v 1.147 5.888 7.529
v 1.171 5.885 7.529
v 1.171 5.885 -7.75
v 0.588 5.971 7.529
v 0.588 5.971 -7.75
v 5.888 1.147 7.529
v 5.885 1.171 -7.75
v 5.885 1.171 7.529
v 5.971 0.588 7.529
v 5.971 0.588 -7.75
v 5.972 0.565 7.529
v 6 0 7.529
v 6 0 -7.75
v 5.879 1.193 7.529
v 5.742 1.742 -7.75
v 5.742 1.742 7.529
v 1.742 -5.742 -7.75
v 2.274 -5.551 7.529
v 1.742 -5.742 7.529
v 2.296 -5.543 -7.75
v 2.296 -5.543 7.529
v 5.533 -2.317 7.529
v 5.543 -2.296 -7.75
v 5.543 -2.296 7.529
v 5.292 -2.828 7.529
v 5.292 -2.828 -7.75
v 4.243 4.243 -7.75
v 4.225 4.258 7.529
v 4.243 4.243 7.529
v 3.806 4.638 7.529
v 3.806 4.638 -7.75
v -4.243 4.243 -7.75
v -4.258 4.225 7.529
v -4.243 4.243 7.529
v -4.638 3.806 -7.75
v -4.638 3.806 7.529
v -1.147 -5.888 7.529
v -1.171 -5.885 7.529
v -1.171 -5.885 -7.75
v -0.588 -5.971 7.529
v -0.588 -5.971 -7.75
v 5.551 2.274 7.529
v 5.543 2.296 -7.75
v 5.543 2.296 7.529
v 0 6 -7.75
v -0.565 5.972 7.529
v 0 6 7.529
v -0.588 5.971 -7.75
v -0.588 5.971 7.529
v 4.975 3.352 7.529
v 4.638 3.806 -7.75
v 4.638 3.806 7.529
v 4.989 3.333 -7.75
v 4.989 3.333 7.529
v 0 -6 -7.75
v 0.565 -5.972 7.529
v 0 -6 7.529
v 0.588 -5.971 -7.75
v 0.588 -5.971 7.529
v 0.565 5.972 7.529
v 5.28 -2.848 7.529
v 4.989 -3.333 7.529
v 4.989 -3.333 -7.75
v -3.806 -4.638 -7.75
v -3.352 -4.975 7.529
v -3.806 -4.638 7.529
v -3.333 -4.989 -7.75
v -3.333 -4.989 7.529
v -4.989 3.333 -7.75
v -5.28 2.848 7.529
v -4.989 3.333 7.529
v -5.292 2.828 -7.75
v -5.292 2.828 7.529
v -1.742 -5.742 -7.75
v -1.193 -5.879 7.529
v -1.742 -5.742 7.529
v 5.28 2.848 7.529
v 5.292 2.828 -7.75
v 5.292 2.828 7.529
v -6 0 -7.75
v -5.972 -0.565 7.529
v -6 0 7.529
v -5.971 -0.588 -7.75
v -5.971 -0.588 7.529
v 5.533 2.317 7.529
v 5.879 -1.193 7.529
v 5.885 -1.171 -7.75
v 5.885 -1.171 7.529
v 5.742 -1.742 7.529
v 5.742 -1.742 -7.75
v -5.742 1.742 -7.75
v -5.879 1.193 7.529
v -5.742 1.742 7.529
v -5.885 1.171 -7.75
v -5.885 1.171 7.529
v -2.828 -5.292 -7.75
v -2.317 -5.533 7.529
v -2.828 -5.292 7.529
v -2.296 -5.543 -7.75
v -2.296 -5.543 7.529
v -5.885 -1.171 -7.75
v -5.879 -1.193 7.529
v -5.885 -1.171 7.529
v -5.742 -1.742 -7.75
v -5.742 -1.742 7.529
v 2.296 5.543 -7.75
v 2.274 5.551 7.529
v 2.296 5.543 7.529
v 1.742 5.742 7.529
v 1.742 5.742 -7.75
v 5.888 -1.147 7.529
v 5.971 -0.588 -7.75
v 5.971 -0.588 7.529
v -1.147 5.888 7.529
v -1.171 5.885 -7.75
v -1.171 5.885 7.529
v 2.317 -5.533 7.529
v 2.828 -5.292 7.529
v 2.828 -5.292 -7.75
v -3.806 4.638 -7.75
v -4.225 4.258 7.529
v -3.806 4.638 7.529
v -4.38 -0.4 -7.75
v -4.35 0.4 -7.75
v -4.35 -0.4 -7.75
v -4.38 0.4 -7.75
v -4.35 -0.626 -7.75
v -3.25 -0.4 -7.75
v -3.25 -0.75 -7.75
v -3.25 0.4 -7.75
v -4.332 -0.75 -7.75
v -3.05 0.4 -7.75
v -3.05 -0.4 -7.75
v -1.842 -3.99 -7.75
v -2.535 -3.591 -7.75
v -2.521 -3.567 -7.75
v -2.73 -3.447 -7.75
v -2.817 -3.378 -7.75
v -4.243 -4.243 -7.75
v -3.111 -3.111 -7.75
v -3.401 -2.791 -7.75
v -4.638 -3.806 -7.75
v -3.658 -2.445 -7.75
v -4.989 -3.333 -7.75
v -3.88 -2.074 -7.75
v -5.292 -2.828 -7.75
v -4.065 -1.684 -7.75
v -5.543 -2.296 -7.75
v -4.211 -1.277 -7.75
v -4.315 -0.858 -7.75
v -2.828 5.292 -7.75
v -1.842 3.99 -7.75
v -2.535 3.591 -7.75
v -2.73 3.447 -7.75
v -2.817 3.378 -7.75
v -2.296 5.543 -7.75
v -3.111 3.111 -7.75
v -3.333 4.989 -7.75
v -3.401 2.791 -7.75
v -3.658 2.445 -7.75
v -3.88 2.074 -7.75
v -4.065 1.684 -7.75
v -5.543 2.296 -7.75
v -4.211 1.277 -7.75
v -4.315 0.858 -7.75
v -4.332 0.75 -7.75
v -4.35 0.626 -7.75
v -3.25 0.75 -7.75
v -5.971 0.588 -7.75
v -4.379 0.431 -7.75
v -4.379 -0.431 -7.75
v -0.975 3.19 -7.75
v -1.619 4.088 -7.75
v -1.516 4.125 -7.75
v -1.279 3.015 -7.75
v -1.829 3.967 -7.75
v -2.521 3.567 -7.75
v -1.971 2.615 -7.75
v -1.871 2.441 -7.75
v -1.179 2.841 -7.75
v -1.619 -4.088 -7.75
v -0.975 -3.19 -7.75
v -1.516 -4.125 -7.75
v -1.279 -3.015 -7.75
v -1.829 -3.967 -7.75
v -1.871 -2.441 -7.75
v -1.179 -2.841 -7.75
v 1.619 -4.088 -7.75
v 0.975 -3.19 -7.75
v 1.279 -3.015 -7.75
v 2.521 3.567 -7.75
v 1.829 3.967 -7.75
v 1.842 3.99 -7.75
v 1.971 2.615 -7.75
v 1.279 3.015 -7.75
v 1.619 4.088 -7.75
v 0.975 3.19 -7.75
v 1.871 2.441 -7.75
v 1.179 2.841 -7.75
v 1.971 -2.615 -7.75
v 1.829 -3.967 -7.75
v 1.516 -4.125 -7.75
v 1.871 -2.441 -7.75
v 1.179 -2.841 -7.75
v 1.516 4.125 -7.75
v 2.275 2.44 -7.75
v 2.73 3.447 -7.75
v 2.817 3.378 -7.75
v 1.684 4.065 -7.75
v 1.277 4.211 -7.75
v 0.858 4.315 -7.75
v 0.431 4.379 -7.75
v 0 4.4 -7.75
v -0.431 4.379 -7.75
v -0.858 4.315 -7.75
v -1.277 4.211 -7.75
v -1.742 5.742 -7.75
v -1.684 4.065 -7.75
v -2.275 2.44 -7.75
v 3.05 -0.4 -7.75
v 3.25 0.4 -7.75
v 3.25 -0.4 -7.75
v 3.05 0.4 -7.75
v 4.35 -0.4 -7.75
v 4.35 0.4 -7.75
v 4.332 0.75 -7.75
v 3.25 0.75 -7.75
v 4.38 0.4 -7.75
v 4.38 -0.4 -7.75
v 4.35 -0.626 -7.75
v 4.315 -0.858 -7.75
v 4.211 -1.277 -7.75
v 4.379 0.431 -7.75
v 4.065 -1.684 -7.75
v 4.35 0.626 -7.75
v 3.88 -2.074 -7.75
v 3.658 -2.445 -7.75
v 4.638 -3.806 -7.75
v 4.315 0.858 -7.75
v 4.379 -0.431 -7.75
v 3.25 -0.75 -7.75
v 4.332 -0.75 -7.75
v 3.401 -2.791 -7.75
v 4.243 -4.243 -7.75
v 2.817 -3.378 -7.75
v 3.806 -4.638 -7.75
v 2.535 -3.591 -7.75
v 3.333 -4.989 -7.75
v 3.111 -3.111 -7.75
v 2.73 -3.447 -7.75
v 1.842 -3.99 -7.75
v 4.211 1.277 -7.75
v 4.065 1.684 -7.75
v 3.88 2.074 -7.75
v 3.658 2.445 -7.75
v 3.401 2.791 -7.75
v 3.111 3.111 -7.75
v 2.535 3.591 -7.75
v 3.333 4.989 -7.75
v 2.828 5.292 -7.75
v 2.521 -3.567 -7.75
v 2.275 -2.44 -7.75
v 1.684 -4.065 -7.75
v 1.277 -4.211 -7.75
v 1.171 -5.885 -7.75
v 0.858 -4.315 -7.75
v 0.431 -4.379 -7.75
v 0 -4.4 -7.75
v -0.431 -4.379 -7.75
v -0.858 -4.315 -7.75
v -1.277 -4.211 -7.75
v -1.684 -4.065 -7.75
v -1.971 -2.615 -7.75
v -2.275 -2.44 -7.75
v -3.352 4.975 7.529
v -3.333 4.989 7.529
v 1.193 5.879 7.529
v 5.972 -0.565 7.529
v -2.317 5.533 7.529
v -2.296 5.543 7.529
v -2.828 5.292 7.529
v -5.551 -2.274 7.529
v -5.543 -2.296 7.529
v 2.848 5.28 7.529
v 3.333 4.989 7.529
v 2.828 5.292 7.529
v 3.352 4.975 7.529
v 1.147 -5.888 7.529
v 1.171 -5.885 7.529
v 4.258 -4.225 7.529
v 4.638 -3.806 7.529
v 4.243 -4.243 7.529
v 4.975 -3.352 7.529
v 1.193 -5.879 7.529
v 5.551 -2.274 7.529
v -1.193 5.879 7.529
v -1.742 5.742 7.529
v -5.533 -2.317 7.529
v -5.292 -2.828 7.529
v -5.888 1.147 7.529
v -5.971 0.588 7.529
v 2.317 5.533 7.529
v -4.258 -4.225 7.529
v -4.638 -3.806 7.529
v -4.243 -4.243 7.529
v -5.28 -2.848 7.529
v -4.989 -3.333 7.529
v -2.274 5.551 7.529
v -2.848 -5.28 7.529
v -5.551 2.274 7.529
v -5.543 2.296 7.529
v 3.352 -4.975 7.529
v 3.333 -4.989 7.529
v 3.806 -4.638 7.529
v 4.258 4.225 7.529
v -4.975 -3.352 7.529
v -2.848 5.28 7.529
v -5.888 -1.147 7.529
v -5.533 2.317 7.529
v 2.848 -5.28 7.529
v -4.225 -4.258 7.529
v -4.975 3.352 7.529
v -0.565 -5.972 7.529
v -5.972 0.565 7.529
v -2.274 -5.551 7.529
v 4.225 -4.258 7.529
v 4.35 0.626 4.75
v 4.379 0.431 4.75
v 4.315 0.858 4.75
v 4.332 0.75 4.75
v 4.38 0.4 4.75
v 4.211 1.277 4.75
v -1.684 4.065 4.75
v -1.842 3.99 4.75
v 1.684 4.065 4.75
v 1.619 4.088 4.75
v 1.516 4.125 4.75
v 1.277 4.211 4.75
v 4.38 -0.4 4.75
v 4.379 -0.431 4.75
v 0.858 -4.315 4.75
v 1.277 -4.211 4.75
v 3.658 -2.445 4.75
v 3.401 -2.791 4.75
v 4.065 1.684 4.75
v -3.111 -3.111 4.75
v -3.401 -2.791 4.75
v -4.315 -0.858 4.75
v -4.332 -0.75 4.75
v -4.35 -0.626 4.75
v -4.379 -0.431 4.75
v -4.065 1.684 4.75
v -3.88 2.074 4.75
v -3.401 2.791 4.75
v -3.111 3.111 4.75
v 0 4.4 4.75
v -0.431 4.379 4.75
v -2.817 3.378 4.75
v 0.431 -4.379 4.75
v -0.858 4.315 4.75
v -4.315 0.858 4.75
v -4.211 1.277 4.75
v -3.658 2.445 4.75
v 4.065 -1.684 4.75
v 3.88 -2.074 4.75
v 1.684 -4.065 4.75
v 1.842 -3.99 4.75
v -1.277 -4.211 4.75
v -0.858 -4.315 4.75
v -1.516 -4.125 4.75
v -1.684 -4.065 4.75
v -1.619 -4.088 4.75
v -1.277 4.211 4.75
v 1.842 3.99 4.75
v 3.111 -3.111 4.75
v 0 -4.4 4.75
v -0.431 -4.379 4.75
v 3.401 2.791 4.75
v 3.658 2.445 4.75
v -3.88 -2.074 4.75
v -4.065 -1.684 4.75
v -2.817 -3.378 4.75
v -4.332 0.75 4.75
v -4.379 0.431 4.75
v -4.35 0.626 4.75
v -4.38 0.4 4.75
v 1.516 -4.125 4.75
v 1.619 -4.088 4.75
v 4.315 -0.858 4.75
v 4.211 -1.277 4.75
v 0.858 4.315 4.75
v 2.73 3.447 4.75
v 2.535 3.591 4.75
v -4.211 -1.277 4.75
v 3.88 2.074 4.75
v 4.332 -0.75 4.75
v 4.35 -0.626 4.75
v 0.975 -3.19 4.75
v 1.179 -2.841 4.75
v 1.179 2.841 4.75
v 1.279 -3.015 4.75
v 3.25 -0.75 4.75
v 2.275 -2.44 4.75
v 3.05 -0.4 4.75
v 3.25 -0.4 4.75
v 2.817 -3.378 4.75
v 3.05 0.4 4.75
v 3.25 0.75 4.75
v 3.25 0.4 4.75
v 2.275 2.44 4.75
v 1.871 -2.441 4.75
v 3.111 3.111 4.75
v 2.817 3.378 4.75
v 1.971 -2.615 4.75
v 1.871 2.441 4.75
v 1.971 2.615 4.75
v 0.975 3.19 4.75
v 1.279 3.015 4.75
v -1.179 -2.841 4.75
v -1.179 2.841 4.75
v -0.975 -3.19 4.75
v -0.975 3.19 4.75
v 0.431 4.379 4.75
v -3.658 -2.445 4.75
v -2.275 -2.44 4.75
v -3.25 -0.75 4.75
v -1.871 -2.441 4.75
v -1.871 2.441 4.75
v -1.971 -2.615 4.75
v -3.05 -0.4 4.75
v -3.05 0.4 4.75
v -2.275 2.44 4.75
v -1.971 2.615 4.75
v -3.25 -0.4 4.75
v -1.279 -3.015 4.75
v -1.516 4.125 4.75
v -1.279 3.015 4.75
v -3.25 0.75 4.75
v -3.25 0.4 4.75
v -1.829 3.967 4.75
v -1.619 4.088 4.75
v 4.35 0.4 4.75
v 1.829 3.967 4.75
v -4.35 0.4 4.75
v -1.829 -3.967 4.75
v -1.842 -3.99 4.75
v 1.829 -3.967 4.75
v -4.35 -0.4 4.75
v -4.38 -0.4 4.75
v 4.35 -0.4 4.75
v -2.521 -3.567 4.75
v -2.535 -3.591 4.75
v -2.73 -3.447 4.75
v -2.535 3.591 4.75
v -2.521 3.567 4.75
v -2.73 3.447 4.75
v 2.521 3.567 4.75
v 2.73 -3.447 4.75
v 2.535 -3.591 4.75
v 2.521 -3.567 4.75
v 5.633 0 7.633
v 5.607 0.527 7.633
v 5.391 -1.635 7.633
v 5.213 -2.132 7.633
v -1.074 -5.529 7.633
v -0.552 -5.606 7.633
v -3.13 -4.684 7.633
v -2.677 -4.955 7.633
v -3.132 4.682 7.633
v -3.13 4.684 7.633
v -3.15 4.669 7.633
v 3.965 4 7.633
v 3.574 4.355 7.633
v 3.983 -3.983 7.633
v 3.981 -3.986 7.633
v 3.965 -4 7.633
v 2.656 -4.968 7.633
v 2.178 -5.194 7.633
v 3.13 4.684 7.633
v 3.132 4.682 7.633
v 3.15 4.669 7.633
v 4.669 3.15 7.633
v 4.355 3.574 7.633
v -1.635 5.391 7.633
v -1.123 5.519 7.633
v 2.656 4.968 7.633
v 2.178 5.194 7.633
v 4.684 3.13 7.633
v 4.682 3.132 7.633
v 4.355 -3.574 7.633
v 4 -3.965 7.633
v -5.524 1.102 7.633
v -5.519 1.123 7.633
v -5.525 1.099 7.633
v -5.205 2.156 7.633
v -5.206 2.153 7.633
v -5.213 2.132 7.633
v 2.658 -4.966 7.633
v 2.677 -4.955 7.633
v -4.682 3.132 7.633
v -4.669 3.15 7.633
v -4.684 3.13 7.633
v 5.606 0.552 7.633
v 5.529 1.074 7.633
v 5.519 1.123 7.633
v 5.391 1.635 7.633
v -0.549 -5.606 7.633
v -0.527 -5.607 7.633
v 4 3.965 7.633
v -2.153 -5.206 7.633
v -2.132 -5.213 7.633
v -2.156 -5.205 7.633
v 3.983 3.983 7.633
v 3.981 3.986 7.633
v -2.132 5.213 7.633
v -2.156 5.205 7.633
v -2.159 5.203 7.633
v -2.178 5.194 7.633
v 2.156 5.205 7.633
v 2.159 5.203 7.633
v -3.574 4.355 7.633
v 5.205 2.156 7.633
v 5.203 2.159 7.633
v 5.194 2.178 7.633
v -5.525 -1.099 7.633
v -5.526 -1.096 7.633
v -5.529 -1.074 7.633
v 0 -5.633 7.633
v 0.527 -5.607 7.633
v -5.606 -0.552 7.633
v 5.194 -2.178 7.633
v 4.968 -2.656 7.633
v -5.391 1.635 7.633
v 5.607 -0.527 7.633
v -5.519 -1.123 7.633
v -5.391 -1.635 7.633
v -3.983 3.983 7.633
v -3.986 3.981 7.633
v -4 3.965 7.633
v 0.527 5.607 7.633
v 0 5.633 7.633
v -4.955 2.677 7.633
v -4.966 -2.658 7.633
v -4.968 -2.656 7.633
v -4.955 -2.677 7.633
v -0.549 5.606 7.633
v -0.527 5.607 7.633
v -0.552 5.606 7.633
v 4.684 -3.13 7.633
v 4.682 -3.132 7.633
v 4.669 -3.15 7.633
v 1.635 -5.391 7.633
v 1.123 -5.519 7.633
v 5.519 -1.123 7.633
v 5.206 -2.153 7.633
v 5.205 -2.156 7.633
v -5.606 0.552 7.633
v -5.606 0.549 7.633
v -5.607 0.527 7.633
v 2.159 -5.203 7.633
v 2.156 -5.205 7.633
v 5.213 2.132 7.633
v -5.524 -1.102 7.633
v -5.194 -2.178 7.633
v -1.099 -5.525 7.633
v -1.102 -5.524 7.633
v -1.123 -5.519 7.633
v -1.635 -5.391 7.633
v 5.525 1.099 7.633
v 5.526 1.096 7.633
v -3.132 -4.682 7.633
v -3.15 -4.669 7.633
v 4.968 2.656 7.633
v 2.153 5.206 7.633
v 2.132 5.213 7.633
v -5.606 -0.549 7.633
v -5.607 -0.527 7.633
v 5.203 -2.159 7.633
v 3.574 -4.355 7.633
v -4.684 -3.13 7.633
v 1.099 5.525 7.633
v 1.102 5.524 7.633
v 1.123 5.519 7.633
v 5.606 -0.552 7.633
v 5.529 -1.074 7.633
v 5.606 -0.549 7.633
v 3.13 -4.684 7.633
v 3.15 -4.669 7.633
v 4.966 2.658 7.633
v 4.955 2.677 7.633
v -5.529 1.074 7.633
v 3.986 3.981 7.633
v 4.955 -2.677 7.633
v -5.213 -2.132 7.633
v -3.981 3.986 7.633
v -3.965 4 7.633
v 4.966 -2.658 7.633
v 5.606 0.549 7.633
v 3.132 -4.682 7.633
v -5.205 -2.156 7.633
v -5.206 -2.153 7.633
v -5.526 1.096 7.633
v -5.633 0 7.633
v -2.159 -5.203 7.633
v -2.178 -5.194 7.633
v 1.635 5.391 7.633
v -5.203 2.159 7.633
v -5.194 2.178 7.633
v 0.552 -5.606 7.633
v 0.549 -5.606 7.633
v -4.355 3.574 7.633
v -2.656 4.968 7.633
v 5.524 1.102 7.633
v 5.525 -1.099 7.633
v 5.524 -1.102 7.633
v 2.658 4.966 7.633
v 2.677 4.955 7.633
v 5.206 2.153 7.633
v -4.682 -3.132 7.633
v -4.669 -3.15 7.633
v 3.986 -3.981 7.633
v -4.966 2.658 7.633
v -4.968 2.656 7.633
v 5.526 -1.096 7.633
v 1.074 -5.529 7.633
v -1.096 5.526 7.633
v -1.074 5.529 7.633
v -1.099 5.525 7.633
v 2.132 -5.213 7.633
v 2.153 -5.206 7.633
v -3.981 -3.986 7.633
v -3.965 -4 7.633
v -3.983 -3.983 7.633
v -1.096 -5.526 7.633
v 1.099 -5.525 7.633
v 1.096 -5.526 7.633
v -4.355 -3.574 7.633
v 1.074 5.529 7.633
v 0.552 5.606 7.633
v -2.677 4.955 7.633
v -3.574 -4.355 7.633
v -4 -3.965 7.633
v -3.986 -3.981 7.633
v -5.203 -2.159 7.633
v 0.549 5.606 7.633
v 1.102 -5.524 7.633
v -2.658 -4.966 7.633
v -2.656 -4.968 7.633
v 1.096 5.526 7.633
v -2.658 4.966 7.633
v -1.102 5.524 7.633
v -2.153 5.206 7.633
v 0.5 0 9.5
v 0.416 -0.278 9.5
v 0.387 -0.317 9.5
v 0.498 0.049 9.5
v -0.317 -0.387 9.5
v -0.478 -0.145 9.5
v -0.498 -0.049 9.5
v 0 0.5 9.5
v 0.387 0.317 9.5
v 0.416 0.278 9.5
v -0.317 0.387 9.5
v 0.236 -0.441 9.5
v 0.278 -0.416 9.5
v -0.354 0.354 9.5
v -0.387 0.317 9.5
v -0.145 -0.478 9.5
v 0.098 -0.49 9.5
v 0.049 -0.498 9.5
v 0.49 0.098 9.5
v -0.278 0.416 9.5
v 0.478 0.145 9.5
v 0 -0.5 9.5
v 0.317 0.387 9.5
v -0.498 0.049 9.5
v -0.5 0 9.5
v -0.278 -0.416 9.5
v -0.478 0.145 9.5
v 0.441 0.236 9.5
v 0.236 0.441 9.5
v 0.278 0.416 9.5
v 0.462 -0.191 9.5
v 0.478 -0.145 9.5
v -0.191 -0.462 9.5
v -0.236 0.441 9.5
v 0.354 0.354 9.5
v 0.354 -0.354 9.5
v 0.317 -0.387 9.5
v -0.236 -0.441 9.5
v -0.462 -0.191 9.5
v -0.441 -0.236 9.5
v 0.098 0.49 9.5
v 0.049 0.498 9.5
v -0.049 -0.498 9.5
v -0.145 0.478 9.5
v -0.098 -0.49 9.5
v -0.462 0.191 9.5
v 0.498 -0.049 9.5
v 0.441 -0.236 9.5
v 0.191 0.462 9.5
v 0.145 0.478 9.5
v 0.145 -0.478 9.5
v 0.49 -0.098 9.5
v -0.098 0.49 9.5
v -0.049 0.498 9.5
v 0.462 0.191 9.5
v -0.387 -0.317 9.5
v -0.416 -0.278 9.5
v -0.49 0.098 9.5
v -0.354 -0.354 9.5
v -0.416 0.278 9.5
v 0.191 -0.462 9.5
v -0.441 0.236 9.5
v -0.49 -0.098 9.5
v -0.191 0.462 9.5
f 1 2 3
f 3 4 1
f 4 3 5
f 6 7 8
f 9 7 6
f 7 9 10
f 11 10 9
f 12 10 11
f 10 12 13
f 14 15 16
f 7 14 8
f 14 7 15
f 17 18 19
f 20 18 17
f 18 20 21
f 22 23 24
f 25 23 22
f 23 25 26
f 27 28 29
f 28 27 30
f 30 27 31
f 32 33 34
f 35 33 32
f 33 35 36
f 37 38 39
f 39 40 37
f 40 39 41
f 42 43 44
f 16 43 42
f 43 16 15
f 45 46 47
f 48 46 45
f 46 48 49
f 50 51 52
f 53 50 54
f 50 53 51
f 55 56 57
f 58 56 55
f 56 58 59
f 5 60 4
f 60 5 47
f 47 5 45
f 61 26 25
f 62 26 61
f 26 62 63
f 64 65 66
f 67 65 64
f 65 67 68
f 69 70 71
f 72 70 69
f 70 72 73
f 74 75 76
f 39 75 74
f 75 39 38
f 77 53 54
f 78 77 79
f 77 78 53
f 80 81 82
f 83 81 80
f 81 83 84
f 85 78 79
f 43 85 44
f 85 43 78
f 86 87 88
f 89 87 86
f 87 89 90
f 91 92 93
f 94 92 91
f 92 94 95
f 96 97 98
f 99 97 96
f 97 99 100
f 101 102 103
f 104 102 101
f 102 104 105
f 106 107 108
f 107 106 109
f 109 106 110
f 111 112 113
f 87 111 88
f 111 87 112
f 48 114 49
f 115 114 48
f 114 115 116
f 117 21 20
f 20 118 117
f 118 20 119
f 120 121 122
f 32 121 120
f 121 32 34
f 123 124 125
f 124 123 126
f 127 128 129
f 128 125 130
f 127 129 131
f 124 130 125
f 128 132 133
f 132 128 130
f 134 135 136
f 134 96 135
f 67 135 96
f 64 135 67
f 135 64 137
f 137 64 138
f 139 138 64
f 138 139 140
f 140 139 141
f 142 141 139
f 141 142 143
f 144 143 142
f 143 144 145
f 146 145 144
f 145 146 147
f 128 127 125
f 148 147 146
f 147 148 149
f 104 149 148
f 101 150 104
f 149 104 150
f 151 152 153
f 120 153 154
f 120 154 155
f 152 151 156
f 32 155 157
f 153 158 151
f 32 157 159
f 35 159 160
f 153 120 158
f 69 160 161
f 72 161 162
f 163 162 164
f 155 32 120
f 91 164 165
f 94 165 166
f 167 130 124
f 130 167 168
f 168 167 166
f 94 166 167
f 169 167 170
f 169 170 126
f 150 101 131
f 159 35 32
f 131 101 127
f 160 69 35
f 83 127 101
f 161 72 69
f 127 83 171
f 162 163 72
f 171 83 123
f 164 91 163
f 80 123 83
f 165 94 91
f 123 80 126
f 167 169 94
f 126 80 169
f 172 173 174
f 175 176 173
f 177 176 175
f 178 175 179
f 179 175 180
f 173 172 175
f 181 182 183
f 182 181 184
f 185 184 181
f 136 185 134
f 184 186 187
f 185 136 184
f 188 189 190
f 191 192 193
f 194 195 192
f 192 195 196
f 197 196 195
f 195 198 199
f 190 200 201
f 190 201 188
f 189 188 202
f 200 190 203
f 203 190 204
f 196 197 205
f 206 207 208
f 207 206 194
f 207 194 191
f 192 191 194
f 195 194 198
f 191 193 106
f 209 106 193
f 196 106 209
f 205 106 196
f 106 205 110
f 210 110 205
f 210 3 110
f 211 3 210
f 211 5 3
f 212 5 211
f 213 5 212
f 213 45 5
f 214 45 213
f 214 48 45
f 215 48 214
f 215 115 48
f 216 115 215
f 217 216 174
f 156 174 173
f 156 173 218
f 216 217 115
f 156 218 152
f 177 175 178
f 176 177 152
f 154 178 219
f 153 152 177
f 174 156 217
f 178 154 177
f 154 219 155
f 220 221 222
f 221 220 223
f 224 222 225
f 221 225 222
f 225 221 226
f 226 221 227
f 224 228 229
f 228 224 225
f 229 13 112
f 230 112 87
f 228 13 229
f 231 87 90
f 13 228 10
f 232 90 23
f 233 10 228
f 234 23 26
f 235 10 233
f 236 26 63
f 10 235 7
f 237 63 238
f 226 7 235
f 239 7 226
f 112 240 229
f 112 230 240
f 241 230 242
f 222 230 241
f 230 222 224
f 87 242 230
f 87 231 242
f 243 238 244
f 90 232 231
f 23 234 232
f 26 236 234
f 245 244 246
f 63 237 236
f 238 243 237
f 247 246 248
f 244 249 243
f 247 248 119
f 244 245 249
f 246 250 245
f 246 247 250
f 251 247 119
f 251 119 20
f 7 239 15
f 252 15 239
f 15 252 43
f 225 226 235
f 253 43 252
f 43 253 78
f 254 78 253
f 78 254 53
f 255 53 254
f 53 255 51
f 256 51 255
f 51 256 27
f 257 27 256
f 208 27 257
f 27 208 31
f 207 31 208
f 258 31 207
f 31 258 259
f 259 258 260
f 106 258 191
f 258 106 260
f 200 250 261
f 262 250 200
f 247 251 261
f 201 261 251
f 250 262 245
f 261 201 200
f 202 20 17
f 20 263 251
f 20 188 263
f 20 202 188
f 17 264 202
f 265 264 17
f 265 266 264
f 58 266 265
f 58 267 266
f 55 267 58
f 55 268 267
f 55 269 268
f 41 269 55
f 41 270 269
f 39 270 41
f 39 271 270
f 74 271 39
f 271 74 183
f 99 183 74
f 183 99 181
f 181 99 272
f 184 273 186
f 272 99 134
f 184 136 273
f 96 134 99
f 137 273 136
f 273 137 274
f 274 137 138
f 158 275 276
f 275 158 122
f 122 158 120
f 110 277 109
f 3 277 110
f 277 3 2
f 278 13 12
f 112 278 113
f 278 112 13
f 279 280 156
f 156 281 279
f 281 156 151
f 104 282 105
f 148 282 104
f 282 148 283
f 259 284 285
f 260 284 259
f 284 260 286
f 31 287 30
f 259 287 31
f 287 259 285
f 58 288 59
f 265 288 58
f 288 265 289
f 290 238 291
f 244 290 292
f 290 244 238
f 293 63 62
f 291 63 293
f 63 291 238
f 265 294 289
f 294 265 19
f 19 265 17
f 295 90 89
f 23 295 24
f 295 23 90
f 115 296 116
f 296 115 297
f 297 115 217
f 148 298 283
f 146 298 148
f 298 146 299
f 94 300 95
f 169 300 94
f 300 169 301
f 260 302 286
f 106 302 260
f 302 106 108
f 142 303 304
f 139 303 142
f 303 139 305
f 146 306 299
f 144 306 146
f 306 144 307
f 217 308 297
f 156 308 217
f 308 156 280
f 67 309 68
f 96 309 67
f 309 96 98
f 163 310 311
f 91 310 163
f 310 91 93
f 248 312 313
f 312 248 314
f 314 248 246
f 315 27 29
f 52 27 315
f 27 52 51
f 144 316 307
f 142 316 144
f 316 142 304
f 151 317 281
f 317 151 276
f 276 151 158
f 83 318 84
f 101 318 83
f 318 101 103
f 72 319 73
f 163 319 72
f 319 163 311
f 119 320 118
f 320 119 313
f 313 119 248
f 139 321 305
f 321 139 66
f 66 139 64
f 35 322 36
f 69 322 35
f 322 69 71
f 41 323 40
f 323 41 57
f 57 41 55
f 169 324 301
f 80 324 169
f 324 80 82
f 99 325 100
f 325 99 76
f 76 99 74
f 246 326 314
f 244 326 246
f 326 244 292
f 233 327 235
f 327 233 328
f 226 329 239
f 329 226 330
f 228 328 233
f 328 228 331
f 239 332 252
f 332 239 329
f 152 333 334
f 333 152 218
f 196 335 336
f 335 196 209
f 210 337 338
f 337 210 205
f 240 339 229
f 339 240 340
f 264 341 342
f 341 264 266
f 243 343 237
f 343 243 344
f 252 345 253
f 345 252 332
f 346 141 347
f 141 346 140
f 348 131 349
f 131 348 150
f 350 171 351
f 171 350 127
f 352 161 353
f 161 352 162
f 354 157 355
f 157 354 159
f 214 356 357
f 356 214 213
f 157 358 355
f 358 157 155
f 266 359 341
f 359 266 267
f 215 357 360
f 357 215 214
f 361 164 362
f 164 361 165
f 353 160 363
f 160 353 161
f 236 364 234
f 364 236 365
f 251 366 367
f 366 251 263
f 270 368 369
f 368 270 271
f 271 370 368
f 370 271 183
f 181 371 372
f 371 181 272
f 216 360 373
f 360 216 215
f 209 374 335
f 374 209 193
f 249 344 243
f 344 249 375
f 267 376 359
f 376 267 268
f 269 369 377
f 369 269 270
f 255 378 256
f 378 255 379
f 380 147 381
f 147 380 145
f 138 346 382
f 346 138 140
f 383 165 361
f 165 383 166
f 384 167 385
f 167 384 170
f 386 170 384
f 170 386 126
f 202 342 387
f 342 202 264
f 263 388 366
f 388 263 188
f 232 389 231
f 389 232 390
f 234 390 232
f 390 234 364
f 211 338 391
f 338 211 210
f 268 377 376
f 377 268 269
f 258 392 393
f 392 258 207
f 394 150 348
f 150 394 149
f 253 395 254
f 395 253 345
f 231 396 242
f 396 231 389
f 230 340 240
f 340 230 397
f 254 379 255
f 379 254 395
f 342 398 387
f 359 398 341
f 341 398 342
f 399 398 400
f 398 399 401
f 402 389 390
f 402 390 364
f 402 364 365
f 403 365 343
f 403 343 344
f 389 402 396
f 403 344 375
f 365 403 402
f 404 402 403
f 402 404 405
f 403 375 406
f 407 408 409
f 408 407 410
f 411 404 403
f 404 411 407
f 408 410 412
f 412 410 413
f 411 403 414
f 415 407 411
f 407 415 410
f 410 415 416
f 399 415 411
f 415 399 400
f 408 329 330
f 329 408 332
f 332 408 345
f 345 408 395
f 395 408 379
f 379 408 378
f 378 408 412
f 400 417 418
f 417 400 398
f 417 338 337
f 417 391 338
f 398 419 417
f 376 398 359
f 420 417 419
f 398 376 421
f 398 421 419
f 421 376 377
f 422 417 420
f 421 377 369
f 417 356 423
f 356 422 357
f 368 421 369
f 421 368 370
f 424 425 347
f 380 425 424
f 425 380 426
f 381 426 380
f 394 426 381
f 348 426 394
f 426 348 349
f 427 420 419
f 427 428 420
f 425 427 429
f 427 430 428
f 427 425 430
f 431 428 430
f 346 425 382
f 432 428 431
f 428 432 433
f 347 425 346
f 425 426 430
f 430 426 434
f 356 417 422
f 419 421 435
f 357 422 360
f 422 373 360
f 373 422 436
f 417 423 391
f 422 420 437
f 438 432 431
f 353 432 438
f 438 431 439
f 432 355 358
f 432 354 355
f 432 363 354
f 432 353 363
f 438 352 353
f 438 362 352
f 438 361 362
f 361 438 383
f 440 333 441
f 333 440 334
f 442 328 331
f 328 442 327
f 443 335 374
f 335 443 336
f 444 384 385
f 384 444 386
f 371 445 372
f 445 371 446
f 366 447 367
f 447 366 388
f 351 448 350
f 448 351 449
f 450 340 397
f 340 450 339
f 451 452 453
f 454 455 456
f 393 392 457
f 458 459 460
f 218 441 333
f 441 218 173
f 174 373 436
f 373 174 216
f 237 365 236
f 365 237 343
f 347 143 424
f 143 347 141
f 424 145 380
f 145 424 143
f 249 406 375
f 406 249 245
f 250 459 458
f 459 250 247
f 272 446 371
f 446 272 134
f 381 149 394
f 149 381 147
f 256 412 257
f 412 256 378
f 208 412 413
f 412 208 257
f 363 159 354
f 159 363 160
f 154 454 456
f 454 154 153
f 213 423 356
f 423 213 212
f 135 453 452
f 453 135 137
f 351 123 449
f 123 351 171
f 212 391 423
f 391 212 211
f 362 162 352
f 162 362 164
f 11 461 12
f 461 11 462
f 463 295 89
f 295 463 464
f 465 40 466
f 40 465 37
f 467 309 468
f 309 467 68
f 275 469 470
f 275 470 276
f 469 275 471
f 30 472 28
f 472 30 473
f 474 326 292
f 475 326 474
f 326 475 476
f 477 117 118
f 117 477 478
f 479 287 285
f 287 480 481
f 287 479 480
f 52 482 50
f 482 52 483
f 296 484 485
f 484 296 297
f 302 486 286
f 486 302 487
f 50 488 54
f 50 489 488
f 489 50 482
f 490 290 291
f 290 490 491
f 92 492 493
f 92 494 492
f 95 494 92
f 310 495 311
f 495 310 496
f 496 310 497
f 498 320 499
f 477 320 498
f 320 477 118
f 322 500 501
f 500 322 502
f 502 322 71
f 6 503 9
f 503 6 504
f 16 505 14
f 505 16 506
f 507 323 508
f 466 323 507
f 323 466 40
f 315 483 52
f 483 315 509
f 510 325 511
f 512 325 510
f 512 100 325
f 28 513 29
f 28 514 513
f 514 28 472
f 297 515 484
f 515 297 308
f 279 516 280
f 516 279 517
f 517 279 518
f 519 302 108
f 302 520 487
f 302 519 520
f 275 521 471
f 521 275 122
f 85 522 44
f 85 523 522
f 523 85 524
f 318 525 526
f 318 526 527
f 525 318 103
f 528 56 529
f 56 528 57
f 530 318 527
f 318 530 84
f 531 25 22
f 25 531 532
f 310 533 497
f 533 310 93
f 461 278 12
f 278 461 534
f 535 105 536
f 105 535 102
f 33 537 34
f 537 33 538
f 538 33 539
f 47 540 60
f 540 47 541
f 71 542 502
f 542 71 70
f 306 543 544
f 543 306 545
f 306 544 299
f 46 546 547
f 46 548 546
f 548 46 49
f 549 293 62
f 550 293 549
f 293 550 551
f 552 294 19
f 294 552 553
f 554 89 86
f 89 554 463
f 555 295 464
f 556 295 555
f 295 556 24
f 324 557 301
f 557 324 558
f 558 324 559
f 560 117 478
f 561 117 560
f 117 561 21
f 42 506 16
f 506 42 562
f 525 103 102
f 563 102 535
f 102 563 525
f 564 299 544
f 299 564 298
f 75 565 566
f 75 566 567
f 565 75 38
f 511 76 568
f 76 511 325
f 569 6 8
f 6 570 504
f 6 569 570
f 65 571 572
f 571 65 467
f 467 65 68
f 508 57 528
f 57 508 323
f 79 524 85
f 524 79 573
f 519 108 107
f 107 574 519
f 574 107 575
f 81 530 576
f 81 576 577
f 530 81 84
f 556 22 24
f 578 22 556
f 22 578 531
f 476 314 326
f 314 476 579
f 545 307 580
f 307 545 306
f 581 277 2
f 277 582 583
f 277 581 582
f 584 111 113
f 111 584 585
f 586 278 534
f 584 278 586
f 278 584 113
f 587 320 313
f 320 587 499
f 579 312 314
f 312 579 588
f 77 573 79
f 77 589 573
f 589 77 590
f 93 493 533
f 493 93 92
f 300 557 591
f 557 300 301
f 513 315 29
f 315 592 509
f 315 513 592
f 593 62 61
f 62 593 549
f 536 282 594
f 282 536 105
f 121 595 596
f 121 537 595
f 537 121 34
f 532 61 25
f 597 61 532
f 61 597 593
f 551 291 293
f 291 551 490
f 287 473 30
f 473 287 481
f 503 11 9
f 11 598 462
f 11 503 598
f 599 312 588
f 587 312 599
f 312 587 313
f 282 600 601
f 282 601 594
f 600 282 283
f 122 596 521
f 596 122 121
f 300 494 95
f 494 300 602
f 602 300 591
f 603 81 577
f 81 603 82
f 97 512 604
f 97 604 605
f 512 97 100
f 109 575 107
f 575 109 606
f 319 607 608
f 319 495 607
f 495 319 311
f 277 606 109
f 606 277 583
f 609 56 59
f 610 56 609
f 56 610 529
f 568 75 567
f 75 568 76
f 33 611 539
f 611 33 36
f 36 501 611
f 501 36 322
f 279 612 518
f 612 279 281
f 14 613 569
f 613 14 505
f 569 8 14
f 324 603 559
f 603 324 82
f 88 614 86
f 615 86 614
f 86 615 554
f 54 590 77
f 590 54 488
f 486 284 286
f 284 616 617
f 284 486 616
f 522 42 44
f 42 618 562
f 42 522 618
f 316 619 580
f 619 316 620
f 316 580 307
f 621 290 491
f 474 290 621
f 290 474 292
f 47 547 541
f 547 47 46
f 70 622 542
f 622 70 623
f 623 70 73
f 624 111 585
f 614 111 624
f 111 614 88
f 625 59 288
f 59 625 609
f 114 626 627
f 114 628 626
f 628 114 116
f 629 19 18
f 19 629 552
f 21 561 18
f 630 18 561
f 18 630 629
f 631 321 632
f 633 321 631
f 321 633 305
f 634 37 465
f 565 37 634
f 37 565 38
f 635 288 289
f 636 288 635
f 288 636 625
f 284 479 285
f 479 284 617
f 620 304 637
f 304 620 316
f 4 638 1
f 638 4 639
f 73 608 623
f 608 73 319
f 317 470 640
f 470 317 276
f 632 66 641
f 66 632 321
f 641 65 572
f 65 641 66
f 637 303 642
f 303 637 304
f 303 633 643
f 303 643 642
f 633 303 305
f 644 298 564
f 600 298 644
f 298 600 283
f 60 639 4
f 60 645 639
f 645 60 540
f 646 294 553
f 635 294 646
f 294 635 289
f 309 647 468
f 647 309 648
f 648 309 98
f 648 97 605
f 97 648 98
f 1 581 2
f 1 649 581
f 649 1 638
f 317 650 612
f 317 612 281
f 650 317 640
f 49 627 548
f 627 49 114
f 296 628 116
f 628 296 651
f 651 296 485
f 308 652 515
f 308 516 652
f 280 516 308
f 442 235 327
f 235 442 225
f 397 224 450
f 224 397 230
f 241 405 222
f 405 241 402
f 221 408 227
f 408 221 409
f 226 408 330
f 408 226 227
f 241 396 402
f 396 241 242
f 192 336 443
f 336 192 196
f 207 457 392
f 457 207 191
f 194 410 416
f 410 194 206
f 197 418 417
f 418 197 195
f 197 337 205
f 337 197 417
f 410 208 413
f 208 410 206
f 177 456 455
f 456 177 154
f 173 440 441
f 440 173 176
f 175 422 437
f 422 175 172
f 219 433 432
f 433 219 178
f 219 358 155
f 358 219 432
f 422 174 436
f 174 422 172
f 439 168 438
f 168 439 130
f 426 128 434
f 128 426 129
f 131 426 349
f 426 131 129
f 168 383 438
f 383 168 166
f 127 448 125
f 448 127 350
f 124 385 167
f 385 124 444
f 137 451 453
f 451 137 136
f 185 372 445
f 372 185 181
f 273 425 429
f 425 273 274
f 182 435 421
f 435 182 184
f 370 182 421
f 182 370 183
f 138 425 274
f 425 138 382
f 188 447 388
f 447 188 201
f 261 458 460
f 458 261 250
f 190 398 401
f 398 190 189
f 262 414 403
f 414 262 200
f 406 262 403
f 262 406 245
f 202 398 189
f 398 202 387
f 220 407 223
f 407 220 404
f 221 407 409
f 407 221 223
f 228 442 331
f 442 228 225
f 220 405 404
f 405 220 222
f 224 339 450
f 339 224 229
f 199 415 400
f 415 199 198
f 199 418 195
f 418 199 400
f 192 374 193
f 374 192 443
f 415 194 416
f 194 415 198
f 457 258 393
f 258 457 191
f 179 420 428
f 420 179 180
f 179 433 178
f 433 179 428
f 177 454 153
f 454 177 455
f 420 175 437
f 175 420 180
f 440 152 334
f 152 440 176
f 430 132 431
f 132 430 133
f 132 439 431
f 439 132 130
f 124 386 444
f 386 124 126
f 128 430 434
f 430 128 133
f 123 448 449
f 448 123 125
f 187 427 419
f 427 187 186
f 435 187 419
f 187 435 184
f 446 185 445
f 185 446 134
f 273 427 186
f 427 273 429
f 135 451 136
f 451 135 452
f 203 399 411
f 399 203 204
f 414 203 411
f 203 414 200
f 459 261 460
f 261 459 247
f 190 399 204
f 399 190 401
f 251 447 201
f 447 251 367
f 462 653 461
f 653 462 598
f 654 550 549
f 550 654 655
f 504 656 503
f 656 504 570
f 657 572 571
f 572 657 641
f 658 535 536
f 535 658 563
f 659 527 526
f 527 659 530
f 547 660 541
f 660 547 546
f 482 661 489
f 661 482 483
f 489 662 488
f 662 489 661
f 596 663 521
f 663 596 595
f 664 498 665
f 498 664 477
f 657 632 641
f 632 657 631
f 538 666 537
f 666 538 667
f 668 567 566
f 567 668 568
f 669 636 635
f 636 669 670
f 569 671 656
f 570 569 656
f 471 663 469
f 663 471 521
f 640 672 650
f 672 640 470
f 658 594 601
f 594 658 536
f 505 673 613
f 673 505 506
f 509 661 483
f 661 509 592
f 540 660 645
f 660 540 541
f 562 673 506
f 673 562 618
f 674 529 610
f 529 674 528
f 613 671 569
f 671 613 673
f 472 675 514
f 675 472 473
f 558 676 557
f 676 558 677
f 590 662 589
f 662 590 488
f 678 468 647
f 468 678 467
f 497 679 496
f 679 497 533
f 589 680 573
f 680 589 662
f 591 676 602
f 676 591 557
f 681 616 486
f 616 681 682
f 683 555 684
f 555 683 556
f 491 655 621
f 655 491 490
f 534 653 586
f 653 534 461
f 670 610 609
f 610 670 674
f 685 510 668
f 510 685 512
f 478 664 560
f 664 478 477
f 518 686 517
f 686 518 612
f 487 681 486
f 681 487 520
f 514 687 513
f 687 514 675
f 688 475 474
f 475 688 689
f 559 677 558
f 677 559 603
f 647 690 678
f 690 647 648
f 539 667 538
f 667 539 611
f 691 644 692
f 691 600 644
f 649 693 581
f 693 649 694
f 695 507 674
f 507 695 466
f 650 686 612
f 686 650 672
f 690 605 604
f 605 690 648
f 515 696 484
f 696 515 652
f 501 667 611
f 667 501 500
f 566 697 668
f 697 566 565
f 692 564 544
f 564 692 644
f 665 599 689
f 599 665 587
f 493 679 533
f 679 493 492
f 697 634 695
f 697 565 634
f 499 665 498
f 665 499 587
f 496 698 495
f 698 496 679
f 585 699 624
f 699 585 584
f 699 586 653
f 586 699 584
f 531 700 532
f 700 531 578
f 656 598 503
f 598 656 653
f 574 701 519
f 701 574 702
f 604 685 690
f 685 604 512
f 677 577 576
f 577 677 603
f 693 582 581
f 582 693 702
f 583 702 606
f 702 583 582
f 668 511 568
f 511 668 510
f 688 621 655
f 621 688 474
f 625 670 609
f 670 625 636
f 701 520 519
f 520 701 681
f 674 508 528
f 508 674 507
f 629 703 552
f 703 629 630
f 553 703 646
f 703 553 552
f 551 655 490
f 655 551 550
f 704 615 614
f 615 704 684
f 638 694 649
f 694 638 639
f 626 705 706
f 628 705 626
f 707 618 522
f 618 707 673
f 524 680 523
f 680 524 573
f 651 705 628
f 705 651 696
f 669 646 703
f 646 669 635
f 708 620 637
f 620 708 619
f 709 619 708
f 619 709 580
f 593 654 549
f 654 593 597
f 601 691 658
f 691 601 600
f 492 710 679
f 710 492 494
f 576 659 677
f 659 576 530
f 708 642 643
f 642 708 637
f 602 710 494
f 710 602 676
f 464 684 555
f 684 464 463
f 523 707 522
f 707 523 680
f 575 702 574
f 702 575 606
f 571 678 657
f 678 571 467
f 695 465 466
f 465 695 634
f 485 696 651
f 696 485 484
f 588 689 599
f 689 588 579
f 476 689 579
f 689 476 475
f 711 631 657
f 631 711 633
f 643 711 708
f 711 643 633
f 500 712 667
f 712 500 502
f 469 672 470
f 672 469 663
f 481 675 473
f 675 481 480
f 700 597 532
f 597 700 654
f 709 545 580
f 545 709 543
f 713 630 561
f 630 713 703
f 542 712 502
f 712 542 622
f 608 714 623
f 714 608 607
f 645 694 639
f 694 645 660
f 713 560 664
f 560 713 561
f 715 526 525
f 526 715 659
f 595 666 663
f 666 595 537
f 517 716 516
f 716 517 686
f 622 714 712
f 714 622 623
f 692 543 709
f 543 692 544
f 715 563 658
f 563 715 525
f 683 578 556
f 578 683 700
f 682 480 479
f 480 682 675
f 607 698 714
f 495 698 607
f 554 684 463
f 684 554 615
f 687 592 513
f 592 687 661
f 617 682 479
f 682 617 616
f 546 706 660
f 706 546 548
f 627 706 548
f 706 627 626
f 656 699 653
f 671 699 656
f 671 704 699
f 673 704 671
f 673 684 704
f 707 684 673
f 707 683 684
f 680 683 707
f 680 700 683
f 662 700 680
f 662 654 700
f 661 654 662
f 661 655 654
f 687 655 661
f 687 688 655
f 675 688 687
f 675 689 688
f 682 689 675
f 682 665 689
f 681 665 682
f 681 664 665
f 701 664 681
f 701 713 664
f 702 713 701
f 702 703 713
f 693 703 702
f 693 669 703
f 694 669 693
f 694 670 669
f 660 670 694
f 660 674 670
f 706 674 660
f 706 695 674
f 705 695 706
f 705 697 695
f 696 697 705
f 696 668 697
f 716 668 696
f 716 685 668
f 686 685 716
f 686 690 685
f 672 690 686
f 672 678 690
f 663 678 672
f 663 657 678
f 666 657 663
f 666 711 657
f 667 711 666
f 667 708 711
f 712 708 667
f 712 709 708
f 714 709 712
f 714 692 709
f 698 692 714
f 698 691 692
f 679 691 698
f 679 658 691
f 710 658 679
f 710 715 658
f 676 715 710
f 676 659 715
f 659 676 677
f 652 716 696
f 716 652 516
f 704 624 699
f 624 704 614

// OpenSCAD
$fn = 64;

difference(){
    tamsmodule();
    difference(){
        translate([0,0,8.5])
            cylinder(h=3, r1=22/2, r2=1/2, center=true);
        translate([0,0,7.6])
            cylinder(h=3, r1=22/2, r2=1/2, center=true);
    }
}

module tamsmodule(){
    difference(){
        cylinder(h=15.5, r1=12/2, r2=12/2, center=true);
        translate([0,0,-2])
            cylinder(h=13.5, r1=8.8/2, r2=8.8/2, center=true);
    }
}

// inner detents
for(var = [0:5]){
    rotate([0,0,360/6 * var])
        translate([12/2 -2.2,0,0])
            cube([1.5-0.4,1.5,15.5], center=true);
}

// outer detents
for (var=[0:6]) {
    rotate([0,0,360/6 * var])
        translate([12/2 -2.2,0,0])
            cube([1.5,0.8,15.5], center=true);
}


// Some kind of lid
translate([0,0,8.5])
    cylinder(h=2, r1=12/2, r2=1/2, center=true);
